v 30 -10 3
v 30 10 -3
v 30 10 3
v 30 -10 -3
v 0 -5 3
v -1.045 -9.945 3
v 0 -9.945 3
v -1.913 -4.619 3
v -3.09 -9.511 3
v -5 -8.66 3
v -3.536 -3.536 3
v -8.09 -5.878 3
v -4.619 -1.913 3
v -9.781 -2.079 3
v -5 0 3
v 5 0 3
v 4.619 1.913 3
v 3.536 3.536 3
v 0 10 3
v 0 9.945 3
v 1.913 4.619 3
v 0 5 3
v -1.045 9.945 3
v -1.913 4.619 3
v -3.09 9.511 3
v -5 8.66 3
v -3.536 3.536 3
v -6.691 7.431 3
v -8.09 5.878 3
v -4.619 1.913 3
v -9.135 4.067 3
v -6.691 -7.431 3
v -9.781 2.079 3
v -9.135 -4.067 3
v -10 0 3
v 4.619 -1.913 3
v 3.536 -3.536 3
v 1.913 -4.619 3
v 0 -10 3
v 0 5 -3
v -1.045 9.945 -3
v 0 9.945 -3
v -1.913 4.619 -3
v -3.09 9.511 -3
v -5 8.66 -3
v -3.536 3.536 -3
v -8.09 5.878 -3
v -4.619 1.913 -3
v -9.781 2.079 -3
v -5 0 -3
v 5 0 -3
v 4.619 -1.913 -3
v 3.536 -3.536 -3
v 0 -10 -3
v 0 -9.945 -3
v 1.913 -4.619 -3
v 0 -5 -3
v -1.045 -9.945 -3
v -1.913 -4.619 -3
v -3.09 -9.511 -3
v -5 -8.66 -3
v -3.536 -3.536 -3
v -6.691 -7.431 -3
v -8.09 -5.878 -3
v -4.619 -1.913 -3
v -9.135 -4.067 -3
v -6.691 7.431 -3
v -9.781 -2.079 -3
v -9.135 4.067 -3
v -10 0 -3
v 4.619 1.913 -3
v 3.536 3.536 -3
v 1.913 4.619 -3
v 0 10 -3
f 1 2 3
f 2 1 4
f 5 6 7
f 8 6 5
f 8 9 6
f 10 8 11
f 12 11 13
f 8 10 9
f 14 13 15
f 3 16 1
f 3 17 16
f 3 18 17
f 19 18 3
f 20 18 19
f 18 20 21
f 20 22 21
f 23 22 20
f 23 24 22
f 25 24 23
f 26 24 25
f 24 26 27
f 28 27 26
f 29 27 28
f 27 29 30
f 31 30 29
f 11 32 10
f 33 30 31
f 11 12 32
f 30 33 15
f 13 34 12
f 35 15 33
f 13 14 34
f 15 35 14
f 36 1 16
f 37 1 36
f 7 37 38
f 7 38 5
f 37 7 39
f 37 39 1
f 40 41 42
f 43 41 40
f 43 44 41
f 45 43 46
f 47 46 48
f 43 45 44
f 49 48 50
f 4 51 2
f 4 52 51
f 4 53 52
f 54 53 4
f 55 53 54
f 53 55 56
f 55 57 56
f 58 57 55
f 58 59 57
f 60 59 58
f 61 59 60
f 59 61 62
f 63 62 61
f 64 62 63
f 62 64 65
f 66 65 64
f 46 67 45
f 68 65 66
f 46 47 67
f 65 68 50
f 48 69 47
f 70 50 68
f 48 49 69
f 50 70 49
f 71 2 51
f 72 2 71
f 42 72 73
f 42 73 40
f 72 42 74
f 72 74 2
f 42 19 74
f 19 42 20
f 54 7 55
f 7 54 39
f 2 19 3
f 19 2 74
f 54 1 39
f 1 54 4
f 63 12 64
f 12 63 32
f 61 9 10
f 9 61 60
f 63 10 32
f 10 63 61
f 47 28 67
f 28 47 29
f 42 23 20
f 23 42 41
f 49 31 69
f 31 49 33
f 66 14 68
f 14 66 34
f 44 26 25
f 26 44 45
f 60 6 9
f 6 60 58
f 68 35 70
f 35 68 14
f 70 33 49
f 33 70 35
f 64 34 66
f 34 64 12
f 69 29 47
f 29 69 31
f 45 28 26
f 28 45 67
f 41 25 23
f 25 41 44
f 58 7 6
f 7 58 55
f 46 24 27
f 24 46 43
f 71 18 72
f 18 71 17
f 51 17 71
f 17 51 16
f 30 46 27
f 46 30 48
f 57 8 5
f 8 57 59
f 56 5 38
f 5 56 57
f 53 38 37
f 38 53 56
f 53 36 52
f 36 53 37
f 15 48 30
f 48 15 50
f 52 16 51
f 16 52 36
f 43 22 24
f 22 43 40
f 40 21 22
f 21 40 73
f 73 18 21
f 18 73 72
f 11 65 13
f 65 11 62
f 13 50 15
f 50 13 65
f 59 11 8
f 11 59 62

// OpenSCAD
difference() {
    union() {
        translate([0, -10, -3]) cube([30, 20, 6]);
        cylinder(h = 6, r = 10, center = true);
    }
    #cylinder(h = 10, r = 5, center = true);
}
